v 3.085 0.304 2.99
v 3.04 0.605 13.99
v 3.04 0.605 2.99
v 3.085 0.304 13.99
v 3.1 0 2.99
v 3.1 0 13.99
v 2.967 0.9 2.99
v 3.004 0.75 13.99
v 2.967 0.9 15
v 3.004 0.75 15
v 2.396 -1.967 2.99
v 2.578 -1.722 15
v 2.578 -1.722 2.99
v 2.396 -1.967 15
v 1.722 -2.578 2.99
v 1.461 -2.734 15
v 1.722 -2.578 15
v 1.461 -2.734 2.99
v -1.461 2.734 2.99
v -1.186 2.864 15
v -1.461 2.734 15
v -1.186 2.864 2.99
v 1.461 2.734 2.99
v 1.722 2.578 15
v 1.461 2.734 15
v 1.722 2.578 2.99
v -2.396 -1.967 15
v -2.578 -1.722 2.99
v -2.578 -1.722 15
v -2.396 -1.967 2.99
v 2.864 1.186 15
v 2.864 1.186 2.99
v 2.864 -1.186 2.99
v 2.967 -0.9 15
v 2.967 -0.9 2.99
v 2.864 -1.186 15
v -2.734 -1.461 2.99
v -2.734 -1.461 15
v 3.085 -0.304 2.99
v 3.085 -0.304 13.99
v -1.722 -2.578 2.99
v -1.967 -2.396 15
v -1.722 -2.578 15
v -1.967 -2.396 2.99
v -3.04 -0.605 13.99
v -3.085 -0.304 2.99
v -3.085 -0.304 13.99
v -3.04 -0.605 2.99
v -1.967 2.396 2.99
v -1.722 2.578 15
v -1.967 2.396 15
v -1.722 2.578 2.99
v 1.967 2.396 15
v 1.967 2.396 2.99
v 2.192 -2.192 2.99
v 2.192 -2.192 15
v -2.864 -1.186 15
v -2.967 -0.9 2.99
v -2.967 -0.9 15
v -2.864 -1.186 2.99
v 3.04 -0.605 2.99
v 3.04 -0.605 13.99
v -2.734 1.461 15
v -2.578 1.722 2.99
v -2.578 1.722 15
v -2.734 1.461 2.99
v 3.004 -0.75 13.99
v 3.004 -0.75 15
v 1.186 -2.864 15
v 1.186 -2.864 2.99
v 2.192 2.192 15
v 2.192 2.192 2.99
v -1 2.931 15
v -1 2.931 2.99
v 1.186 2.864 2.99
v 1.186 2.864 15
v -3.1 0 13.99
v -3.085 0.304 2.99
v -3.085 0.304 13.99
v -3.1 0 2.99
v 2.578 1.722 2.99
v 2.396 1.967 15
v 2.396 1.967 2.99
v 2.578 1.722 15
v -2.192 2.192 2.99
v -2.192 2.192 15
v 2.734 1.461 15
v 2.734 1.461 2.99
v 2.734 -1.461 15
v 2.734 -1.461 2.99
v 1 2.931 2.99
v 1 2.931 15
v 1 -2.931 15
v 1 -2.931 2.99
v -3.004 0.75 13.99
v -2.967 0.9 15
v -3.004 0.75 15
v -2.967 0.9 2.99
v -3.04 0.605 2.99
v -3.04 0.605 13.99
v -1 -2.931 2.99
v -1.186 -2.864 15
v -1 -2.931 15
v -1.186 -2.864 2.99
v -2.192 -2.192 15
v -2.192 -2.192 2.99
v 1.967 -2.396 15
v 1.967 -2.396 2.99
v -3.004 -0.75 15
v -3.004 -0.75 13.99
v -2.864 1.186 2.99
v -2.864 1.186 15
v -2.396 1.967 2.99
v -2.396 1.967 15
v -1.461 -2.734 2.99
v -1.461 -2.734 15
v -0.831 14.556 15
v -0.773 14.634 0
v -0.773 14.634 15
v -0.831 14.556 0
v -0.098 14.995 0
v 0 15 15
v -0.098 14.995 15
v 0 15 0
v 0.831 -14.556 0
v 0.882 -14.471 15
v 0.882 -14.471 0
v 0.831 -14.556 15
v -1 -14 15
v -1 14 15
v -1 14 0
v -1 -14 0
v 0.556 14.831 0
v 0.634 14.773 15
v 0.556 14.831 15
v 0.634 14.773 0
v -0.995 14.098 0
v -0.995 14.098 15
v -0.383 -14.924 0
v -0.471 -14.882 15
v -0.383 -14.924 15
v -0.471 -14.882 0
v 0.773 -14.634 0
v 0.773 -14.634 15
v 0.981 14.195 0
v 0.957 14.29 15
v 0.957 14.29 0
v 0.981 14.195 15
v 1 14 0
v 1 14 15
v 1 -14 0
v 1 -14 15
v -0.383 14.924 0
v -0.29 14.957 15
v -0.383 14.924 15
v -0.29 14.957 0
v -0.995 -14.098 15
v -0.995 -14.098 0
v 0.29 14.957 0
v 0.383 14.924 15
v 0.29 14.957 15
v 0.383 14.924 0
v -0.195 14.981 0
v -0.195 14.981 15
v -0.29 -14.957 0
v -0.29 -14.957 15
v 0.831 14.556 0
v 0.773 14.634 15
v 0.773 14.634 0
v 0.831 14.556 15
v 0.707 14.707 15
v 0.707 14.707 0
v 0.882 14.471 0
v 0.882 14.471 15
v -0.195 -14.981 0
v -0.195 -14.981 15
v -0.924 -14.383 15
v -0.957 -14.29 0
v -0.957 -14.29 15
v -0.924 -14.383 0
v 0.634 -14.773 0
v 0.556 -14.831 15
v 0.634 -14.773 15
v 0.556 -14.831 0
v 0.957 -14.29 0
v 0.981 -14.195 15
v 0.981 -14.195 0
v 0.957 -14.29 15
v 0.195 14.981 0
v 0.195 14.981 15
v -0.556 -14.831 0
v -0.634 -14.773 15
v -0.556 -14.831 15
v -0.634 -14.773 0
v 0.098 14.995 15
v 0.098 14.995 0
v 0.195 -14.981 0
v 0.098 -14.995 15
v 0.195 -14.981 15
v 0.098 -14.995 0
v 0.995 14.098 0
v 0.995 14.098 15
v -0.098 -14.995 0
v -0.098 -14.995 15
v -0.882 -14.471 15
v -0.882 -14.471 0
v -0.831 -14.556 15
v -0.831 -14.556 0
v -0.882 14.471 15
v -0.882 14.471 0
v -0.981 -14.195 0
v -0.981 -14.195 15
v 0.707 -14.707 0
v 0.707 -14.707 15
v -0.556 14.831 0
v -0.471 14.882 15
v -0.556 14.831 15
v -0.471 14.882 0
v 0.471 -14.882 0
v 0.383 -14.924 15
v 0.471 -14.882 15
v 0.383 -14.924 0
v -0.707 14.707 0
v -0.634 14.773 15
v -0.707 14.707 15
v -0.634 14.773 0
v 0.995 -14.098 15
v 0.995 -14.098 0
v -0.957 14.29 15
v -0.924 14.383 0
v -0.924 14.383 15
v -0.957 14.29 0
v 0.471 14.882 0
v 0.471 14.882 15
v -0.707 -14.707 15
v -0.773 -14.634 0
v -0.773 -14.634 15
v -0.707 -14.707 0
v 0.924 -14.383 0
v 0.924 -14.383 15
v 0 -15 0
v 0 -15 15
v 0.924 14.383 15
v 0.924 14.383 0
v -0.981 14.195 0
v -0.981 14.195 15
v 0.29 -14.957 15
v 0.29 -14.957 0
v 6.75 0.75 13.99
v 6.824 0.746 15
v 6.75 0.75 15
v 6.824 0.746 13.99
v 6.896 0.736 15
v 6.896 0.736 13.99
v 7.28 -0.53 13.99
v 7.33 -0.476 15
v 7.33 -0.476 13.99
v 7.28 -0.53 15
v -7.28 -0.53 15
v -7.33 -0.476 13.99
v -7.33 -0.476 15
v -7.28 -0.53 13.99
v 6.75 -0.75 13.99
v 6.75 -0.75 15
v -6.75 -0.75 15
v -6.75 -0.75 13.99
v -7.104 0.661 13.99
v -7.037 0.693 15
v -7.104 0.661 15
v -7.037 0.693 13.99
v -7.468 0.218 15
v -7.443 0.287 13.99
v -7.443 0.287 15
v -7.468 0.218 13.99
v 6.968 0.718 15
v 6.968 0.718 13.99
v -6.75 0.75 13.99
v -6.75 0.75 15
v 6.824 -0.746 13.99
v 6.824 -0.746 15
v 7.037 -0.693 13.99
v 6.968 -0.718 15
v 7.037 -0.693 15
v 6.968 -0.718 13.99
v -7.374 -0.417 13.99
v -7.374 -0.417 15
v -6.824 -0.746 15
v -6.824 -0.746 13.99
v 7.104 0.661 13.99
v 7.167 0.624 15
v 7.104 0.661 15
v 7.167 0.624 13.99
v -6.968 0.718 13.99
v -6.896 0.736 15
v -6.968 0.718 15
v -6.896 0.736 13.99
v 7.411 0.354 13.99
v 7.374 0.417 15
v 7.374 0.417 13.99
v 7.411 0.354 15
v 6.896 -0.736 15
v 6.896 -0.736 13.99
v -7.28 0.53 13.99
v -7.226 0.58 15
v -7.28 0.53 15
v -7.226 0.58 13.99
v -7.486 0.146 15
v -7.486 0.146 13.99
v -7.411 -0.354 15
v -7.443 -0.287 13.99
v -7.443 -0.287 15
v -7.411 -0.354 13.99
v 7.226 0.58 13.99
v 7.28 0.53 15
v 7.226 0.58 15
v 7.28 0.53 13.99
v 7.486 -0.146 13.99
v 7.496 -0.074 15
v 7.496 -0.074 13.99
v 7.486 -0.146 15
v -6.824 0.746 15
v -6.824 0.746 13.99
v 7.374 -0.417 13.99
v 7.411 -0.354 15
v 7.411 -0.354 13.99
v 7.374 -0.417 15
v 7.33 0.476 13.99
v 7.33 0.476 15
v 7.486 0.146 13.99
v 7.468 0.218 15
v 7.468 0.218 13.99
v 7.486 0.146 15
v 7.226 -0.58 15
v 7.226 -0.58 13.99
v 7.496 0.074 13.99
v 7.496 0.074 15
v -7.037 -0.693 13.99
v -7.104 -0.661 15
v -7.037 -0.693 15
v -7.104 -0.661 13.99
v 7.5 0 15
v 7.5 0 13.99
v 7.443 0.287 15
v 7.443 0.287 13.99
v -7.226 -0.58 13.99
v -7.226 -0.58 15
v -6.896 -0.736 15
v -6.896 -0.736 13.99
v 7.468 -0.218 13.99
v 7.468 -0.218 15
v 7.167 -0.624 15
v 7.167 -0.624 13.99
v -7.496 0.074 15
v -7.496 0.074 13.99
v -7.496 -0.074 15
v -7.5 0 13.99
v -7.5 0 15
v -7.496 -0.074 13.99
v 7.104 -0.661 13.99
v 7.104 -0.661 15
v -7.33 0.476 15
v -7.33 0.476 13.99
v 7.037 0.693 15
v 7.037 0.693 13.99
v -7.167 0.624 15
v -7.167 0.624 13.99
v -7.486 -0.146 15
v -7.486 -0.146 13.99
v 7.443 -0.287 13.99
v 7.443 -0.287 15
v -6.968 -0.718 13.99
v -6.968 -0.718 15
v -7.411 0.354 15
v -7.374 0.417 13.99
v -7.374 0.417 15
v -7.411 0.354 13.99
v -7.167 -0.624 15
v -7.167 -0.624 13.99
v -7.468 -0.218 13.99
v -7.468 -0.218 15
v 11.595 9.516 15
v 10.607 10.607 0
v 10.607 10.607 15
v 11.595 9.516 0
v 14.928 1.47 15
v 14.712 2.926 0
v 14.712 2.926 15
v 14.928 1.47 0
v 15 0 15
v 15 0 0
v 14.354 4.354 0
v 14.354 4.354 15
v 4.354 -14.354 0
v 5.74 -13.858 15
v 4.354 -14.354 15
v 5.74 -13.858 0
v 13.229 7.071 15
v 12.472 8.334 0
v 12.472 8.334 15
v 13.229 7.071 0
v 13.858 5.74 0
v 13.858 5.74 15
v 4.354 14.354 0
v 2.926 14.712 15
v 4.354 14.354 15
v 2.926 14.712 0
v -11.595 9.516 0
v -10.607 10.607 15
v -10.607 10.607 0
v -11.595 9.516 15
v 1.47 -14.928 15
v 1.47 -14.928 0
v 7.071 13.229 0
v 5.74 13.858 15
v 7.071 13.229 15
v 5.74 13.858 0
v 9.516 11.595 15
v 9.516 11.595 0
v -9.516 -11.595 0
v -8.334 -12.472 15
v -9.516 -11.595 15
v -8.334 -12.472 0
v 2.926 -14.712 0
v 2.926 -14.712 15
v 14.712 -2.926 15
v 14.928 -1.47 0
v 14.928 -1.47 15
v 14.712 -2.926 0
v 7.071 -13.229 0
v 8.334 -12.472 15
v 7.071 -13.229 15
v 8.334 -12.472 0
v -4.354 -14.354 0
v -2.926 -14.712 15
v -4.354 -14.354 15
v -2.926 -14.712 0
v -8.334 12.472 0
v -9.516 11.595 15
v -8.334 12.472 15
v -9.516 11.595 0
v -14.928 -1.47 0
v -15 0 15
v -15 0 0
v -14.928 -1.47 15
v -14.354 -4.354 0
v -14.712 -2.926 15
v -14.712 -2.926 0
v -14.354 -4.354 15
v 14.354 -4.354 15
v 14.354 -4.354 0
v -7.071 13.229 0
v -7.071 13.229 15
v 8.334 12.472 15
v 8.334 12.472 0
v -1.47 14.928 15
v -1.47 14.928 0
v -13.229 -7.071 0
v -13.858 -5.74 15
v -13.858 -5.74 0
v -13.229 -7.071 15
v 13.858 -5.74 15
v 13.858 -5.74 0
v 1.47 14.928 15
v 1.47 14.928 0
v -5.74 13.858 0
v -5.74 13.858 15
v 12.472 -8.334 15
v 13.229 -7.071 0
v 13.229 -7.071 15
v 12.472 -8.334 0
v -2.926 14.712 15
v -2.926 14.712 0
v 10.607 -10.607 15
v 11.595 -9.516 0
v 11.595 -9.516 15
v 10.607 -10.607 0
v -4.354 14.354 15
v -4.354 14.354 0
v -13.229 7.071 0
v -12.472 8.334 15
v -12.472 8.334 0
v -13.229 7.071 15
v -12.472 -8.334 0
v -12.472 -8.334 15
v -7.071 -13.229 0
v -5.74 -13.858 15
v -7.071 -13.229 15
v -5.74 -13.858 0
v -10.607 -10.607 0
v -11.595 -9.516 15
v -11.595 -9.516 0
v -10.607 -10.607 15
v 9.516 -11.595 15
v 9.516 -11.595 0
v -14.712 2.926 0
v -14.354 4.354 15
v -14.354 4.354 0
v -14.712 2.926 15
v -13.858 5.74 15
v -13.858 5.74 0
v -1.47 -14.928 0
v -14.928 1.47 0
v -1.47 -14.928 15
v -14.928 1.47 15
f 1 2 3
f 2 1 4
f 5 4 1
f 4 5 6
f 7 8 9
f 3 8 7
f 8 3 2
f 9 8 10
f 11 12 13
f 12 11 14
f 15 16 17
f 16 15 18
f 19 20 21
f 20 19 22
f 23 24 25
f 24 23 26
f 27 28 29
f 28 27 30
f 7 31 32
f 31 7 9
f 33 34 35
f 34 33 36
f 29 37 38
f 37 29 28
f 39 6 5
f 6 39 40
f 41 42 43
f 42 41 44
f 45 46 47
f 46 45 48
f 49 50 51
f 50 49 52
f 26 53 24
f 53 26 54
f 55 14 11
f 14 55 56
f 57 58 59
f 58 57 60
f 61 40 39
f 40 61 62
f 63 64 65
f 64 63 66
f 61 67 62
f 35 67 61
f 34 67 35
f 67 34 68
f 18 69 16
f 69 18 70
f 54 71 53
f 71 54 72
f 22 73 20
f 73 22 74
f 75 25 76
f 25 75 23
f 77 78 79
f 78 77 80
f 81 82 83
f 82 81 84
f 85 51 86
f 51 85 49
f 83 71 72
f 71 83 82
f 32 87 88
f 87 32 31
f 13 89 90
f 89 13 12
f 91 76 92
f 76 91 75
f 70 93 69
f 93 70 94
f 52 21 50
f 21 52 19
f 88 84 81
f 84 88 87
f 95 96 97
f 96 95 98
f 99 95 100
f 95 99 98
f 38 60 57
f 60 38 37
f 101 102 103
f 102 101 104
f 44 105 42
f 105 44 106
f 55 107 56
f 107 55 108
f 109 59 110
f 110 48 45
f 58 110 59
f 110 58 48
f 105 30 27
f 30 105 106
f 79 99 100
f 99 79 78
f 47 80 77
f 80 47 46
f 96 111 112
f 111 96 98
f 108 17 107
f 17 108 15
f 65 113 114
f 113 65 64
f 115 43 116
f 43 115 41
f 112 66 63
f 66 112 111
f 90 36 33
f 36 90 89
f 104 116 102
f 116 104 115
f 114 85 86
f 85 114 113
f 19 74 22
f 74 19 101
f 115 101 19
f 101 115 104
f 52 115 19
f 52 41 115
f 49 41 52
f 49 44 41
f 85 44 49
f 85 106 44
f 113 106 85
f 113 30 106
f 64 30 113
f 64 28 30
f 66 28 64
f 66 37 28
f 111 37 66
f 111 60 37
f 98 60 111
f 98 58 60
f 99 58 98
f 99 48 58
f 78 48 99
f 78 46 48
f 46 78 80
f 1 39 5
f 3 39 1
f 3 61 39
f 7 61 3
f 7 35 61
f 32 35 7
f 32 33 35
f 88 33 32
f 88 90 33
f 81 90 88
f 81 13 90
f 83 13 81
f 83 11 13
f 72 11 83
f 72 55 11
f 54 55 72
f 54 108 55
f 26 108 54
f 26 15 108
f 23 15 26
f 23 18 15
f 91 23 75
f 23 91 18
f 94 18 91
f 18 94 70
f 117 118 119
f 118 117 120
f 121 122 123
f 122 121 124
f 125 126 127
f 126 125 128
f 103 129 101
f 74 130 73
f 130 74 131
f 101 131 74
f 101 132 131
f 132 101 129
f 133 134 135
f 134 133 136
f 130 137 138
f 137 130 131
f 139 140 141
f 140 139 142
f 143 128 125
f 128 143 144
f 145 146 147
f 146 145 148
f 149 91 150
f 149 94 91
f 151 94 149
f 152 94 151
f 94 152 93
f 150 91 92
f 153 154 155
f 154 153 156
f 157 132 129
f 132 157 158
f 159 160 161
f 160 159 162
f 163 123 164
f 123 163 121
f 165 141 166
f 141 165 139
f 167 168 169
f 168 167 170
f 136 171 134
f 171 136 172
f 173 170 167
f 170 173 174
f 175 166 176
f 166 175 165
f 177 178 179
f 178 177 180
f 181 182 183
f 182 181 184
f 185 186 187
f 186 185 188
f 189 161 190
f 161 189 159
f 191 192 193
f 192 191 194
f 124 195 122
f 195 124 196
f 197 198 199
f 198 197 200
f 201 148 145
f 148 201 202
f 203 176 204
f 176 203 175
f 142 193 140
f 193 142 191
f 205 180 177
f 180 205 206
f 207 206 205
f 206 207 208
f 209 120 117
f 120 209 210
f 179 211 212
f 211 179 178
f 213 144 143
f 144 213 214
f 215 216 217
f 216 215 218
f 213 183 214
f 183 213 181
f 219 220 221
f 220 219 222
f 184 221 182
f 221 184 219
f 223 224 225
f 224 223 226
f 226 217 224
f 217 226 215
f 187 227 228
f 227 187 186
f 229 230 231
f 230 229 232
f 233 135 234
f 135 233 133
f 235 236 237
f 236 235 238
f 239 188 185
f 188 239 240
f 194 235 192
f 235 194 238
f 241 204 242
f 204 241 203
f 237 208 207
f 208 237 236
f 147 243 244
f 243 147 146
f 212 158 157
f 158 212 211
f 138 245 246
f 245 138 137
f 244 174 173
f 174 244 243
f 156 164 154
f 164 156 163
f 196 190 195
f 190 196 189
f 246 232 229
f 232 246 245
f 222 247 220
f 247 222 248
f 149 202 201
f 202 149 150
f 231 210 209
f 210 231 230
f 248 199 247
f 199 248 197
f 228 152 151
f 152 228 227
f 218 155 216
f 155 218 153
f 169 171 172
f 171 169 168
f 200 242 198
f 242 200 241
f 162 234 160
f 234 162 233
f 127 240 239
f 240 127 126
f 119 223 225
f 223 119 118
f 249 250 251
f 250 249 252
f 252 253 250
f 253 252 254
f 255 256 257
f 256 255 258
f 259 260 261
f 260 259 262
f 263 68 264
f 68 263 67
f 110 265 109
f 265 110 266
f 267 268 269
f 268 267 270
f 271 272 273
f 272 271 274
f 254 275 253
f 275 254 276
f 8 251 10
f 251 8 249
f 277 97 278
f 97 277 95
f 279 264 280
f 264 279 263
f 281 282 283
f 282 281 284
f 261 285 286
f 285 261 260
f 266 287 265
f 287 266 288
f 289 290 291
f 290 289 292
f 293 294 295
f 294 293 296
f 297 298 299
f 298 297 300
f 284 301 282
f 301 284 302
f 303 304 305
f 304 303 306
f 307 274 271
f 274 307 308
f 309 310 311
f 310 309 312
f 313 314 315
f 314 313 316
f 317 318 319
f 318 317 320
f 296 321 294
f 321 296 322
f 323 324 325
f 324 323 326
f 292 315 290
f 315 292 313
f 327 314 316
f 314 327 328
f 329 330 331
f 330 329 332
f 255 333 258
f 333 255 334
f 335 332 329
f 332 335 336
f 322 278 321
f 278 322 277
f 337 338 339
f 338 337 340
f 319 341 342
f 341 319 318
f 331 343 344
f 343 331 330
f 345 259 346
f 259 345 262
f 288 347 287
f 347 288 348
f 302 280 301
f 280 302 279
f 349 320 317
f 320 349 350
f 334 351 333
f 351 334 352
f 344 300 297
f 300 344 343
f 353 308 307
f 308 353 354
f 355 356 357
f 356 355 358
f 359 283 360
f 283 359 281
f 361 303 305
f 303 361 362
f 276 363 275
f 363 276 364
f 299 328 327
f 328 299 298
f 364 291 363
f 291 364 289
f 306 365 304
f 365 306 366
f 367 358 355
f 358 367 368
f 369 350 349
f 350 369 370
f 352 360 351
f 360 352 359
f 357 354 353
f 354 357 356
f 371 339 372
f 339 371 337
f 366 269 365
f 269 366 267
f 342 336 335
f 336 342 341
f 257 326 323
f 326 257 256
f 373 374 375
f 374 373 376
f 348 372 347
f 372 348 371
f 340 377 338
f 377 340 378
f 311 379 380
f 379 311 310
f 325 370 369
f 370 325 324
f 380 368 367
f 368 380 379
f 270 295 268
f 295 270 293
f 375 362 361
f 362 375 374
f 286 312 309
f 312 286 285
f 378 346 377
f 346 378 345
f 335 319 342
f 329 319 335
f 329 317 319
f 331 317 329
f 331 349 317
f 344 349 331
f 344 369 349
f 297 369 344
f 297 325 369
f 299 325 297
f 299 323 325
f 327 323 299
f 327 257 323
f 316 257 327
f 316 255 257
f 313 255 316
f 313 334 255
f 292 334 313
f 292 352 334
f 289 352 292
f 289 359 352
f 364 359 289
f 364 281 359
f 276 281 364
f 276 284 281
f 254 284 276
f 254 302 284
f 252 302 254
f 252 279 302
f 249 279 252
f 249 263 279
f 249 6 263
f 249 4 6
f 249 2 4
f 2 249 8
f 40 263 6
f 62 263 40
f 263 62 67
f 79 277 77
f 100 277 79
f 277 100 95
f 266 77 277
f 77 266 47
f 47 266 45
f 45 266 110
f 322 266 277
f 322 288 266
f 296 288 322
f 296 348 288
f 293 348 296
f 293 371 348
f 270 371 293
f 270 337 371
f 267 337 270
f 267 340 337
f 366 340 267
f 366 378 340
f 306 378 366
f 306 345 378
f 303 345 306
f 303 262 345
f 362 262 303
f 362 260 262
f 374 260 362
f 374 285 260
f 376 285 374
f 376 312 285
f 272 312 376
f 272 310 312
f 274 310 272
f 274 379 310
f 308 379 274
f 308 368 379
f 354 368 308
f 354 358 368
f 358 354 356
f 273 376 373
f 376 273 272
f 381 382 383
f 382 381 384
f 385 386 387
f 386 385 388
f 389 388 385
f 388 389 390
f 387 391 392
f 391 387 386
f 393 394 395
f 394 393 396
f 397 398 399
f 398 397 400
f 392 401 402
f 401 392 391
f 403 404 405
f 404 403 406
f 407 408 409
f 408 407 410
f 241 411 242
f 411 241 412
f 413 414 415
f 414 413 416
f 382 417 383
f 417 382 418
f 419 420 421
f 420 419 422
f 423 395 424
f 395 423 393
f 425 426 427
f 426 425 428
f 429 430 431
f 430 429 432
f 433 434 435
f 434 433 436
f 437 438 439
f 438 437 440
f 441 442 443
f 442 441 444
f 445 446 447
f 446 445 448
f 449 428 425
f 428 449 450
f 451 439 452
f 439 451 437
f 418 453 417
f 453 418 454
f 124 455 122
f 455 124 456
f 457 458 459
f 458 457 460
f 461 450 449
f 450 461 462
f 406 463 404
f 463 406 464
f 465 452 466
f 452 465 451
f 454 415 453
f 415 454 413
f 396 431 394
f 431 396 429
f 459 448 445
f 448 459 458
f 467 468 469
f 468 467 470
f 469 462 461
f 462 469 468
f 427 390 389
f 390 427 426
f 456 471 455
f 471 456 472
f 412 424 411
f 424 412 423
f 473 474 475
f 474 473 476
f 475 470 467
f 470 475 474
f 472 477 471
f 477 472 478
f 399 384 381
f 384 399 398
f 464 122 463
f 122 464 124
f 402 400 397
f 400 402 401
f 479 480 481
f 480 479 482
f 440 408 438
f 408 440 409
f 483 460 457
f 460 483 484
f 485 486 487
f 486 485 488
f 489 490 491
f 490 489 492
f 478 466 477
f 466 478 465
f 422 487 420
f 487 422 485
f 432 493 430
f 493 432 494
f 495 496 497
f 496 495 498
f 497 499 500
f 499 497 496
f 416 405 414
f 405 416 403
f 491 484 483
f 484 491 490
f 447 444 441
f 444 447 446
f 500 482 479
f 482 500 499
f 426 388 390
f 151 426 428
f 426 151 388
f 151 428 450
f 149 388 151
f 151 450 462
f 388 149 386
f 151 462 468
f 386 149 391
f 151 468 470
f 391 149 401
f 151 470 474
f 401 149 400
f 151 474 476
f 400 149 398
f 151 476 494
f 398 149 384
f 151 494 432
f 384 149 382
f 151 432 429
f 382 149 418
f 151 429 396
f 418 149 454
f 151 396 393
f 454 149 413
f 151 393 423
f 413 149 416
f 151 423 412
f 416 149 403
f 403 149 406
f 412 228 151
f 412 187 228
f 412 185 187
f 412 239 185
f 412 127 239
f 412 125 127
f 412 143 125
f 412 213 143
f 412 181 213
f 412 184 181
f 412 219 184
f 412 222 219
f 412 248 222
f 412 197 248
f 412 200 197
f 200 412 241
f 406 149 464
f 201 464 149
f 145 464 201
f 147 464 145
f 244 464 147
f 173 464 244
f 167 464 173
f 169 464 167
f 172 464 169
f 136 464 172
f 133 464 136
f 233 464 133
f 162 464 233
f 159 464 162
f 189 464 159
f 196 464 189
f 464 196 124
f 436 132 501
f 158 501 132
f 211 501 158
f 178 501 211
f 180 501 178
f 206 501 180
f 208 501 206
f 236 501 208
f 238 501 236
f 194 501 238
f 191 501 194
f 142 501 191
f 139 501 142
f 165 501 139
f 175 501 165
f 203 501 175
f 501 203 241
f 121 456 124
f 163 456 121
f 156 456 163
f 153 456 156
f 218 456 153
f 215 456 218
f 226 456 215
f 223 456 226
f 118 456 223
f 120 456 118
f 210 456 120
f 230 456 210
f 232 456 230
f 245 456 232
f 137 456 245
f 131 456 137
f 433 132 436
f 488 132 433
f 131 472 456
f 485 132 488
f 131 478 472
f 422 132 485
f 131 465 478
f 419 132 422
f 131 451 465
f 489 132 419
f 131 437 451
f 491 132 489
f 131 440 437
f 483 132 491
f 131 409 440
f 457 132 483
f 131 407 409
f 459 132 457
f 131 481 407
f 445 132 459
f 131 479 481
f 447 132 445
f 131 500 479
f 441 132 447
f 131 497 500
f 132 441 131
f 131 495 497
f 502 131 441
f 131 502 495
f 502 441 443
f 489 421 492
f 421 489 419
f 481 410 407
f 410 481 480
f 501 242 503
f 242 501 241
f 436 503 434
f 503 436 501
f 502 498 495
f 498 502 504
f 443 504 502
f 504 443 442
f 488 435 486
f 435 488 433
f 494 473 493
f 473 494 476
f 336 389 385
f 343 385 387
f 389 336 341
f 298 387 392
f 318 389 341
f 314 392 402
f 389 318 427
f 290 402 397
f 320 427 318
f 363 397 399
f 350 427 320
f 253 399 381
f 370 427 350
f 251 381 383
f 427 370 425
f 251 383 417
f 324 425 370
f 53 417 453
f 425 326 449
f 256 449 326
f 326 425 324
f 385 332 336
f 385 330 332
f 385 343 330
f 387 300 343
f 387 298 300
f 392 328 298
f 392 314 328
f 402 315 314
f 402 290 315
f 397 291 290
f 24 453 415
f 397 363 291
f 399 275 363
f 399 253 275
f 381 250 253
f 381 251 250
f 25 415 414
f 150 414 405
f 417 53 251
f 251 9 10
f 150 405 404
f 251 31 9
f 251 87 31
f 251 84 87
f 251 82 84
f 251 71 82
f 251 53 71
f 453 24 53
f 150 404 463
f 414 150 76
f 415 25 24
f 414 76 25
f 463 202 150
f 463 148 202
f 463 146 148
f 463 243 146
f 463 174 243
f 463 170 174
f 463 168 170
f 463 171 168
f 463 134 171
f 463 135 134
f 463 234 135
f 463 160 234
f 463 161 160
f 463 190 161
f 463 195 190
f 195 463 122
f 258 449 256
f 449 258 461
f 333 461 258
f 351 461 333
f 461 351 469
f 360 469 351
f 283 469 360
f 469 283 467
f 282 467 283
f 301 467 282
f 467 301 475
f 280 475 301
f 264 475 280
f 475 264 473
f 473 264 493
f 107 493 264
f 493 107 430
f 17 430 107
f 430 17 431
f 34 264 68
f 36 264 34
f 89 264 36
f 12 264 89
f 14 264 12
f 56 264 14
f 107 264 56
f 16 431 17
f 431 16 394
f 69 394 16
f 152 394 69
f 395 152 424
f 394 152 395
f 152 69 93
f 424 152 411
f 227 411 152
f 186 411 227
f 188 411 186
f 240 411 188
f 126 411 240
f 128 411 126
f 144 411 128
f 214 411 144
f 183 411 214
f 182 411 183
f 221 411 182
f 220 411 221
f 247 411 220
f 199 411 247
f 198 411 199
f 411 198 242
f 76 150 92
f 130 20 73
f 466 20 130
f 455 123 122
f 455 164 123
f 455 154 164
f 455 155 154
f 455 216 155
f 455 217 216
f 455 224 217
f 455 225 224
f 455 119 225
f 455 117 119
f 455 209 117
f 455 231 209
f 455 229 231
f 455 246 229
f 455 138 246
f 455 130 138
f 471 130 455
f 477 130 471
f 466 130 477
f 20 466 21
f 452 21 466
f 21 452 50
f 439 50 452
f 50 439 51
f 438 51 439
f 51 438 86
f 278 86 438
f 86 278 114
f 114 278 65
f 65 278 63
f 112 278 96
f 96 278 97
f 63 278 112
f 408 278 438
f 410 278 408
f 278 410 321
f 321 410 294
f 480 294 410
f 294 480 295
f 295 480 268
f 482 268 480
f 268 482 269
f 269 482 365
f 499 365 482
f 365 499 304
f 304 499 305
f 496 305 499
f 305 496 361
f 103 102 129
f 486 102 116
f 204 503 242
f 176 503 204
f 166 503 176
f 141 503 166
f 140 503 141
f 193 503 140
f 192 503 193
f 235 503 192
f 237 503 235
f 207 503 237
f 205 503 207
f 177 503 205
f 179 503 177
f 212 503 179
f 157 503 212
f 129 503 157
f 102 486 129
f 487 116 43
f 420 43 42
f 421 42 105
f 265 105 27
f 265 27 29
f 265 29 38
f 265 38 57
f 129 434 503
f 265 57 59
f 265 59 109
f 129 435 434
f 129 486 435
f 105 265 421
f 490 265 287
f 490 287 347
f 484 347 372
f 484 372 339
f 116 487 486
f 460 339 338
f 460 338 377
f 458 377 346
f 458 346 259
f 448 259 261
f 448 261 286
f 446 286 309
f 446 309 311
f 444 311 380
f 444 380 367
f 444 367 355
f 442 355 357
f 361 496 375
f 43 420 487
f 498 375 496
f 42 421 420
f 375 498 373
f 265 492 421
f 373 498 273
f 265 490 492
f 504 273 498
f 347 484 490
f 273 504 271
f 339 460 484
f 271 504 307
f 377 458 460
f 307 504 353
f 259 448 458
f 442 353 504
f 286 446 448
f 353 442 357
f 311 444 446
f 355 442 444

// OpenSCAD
// Built by bench/smallmodels/features/compiler.py from a list of features.
$fn = 64;
difference() {
  union() {
    translate([0, 0, 0]) cylinder(d = 30, h = 15);
  }
  union() {
    translate([0, 0, 2.99]) rotate([0, 0, 0]) cylinder(d = 6.2, h = 12.02);
    translate([0, 0, -0.01]) rotate([0, 0, 90]) hull() { for (s = [-1, 1]) translate([s * 14, 0, 0]) cylinder(d = 2, h = 15.02); }
    translate([0, 0, 13.99]) rotate([0, 0, 0]) hull() { for (s = [-1, 1]) translate([s * 6.75, 0, 0]) cylinder(d = 1.5, h = 1.02); }
  }
}
